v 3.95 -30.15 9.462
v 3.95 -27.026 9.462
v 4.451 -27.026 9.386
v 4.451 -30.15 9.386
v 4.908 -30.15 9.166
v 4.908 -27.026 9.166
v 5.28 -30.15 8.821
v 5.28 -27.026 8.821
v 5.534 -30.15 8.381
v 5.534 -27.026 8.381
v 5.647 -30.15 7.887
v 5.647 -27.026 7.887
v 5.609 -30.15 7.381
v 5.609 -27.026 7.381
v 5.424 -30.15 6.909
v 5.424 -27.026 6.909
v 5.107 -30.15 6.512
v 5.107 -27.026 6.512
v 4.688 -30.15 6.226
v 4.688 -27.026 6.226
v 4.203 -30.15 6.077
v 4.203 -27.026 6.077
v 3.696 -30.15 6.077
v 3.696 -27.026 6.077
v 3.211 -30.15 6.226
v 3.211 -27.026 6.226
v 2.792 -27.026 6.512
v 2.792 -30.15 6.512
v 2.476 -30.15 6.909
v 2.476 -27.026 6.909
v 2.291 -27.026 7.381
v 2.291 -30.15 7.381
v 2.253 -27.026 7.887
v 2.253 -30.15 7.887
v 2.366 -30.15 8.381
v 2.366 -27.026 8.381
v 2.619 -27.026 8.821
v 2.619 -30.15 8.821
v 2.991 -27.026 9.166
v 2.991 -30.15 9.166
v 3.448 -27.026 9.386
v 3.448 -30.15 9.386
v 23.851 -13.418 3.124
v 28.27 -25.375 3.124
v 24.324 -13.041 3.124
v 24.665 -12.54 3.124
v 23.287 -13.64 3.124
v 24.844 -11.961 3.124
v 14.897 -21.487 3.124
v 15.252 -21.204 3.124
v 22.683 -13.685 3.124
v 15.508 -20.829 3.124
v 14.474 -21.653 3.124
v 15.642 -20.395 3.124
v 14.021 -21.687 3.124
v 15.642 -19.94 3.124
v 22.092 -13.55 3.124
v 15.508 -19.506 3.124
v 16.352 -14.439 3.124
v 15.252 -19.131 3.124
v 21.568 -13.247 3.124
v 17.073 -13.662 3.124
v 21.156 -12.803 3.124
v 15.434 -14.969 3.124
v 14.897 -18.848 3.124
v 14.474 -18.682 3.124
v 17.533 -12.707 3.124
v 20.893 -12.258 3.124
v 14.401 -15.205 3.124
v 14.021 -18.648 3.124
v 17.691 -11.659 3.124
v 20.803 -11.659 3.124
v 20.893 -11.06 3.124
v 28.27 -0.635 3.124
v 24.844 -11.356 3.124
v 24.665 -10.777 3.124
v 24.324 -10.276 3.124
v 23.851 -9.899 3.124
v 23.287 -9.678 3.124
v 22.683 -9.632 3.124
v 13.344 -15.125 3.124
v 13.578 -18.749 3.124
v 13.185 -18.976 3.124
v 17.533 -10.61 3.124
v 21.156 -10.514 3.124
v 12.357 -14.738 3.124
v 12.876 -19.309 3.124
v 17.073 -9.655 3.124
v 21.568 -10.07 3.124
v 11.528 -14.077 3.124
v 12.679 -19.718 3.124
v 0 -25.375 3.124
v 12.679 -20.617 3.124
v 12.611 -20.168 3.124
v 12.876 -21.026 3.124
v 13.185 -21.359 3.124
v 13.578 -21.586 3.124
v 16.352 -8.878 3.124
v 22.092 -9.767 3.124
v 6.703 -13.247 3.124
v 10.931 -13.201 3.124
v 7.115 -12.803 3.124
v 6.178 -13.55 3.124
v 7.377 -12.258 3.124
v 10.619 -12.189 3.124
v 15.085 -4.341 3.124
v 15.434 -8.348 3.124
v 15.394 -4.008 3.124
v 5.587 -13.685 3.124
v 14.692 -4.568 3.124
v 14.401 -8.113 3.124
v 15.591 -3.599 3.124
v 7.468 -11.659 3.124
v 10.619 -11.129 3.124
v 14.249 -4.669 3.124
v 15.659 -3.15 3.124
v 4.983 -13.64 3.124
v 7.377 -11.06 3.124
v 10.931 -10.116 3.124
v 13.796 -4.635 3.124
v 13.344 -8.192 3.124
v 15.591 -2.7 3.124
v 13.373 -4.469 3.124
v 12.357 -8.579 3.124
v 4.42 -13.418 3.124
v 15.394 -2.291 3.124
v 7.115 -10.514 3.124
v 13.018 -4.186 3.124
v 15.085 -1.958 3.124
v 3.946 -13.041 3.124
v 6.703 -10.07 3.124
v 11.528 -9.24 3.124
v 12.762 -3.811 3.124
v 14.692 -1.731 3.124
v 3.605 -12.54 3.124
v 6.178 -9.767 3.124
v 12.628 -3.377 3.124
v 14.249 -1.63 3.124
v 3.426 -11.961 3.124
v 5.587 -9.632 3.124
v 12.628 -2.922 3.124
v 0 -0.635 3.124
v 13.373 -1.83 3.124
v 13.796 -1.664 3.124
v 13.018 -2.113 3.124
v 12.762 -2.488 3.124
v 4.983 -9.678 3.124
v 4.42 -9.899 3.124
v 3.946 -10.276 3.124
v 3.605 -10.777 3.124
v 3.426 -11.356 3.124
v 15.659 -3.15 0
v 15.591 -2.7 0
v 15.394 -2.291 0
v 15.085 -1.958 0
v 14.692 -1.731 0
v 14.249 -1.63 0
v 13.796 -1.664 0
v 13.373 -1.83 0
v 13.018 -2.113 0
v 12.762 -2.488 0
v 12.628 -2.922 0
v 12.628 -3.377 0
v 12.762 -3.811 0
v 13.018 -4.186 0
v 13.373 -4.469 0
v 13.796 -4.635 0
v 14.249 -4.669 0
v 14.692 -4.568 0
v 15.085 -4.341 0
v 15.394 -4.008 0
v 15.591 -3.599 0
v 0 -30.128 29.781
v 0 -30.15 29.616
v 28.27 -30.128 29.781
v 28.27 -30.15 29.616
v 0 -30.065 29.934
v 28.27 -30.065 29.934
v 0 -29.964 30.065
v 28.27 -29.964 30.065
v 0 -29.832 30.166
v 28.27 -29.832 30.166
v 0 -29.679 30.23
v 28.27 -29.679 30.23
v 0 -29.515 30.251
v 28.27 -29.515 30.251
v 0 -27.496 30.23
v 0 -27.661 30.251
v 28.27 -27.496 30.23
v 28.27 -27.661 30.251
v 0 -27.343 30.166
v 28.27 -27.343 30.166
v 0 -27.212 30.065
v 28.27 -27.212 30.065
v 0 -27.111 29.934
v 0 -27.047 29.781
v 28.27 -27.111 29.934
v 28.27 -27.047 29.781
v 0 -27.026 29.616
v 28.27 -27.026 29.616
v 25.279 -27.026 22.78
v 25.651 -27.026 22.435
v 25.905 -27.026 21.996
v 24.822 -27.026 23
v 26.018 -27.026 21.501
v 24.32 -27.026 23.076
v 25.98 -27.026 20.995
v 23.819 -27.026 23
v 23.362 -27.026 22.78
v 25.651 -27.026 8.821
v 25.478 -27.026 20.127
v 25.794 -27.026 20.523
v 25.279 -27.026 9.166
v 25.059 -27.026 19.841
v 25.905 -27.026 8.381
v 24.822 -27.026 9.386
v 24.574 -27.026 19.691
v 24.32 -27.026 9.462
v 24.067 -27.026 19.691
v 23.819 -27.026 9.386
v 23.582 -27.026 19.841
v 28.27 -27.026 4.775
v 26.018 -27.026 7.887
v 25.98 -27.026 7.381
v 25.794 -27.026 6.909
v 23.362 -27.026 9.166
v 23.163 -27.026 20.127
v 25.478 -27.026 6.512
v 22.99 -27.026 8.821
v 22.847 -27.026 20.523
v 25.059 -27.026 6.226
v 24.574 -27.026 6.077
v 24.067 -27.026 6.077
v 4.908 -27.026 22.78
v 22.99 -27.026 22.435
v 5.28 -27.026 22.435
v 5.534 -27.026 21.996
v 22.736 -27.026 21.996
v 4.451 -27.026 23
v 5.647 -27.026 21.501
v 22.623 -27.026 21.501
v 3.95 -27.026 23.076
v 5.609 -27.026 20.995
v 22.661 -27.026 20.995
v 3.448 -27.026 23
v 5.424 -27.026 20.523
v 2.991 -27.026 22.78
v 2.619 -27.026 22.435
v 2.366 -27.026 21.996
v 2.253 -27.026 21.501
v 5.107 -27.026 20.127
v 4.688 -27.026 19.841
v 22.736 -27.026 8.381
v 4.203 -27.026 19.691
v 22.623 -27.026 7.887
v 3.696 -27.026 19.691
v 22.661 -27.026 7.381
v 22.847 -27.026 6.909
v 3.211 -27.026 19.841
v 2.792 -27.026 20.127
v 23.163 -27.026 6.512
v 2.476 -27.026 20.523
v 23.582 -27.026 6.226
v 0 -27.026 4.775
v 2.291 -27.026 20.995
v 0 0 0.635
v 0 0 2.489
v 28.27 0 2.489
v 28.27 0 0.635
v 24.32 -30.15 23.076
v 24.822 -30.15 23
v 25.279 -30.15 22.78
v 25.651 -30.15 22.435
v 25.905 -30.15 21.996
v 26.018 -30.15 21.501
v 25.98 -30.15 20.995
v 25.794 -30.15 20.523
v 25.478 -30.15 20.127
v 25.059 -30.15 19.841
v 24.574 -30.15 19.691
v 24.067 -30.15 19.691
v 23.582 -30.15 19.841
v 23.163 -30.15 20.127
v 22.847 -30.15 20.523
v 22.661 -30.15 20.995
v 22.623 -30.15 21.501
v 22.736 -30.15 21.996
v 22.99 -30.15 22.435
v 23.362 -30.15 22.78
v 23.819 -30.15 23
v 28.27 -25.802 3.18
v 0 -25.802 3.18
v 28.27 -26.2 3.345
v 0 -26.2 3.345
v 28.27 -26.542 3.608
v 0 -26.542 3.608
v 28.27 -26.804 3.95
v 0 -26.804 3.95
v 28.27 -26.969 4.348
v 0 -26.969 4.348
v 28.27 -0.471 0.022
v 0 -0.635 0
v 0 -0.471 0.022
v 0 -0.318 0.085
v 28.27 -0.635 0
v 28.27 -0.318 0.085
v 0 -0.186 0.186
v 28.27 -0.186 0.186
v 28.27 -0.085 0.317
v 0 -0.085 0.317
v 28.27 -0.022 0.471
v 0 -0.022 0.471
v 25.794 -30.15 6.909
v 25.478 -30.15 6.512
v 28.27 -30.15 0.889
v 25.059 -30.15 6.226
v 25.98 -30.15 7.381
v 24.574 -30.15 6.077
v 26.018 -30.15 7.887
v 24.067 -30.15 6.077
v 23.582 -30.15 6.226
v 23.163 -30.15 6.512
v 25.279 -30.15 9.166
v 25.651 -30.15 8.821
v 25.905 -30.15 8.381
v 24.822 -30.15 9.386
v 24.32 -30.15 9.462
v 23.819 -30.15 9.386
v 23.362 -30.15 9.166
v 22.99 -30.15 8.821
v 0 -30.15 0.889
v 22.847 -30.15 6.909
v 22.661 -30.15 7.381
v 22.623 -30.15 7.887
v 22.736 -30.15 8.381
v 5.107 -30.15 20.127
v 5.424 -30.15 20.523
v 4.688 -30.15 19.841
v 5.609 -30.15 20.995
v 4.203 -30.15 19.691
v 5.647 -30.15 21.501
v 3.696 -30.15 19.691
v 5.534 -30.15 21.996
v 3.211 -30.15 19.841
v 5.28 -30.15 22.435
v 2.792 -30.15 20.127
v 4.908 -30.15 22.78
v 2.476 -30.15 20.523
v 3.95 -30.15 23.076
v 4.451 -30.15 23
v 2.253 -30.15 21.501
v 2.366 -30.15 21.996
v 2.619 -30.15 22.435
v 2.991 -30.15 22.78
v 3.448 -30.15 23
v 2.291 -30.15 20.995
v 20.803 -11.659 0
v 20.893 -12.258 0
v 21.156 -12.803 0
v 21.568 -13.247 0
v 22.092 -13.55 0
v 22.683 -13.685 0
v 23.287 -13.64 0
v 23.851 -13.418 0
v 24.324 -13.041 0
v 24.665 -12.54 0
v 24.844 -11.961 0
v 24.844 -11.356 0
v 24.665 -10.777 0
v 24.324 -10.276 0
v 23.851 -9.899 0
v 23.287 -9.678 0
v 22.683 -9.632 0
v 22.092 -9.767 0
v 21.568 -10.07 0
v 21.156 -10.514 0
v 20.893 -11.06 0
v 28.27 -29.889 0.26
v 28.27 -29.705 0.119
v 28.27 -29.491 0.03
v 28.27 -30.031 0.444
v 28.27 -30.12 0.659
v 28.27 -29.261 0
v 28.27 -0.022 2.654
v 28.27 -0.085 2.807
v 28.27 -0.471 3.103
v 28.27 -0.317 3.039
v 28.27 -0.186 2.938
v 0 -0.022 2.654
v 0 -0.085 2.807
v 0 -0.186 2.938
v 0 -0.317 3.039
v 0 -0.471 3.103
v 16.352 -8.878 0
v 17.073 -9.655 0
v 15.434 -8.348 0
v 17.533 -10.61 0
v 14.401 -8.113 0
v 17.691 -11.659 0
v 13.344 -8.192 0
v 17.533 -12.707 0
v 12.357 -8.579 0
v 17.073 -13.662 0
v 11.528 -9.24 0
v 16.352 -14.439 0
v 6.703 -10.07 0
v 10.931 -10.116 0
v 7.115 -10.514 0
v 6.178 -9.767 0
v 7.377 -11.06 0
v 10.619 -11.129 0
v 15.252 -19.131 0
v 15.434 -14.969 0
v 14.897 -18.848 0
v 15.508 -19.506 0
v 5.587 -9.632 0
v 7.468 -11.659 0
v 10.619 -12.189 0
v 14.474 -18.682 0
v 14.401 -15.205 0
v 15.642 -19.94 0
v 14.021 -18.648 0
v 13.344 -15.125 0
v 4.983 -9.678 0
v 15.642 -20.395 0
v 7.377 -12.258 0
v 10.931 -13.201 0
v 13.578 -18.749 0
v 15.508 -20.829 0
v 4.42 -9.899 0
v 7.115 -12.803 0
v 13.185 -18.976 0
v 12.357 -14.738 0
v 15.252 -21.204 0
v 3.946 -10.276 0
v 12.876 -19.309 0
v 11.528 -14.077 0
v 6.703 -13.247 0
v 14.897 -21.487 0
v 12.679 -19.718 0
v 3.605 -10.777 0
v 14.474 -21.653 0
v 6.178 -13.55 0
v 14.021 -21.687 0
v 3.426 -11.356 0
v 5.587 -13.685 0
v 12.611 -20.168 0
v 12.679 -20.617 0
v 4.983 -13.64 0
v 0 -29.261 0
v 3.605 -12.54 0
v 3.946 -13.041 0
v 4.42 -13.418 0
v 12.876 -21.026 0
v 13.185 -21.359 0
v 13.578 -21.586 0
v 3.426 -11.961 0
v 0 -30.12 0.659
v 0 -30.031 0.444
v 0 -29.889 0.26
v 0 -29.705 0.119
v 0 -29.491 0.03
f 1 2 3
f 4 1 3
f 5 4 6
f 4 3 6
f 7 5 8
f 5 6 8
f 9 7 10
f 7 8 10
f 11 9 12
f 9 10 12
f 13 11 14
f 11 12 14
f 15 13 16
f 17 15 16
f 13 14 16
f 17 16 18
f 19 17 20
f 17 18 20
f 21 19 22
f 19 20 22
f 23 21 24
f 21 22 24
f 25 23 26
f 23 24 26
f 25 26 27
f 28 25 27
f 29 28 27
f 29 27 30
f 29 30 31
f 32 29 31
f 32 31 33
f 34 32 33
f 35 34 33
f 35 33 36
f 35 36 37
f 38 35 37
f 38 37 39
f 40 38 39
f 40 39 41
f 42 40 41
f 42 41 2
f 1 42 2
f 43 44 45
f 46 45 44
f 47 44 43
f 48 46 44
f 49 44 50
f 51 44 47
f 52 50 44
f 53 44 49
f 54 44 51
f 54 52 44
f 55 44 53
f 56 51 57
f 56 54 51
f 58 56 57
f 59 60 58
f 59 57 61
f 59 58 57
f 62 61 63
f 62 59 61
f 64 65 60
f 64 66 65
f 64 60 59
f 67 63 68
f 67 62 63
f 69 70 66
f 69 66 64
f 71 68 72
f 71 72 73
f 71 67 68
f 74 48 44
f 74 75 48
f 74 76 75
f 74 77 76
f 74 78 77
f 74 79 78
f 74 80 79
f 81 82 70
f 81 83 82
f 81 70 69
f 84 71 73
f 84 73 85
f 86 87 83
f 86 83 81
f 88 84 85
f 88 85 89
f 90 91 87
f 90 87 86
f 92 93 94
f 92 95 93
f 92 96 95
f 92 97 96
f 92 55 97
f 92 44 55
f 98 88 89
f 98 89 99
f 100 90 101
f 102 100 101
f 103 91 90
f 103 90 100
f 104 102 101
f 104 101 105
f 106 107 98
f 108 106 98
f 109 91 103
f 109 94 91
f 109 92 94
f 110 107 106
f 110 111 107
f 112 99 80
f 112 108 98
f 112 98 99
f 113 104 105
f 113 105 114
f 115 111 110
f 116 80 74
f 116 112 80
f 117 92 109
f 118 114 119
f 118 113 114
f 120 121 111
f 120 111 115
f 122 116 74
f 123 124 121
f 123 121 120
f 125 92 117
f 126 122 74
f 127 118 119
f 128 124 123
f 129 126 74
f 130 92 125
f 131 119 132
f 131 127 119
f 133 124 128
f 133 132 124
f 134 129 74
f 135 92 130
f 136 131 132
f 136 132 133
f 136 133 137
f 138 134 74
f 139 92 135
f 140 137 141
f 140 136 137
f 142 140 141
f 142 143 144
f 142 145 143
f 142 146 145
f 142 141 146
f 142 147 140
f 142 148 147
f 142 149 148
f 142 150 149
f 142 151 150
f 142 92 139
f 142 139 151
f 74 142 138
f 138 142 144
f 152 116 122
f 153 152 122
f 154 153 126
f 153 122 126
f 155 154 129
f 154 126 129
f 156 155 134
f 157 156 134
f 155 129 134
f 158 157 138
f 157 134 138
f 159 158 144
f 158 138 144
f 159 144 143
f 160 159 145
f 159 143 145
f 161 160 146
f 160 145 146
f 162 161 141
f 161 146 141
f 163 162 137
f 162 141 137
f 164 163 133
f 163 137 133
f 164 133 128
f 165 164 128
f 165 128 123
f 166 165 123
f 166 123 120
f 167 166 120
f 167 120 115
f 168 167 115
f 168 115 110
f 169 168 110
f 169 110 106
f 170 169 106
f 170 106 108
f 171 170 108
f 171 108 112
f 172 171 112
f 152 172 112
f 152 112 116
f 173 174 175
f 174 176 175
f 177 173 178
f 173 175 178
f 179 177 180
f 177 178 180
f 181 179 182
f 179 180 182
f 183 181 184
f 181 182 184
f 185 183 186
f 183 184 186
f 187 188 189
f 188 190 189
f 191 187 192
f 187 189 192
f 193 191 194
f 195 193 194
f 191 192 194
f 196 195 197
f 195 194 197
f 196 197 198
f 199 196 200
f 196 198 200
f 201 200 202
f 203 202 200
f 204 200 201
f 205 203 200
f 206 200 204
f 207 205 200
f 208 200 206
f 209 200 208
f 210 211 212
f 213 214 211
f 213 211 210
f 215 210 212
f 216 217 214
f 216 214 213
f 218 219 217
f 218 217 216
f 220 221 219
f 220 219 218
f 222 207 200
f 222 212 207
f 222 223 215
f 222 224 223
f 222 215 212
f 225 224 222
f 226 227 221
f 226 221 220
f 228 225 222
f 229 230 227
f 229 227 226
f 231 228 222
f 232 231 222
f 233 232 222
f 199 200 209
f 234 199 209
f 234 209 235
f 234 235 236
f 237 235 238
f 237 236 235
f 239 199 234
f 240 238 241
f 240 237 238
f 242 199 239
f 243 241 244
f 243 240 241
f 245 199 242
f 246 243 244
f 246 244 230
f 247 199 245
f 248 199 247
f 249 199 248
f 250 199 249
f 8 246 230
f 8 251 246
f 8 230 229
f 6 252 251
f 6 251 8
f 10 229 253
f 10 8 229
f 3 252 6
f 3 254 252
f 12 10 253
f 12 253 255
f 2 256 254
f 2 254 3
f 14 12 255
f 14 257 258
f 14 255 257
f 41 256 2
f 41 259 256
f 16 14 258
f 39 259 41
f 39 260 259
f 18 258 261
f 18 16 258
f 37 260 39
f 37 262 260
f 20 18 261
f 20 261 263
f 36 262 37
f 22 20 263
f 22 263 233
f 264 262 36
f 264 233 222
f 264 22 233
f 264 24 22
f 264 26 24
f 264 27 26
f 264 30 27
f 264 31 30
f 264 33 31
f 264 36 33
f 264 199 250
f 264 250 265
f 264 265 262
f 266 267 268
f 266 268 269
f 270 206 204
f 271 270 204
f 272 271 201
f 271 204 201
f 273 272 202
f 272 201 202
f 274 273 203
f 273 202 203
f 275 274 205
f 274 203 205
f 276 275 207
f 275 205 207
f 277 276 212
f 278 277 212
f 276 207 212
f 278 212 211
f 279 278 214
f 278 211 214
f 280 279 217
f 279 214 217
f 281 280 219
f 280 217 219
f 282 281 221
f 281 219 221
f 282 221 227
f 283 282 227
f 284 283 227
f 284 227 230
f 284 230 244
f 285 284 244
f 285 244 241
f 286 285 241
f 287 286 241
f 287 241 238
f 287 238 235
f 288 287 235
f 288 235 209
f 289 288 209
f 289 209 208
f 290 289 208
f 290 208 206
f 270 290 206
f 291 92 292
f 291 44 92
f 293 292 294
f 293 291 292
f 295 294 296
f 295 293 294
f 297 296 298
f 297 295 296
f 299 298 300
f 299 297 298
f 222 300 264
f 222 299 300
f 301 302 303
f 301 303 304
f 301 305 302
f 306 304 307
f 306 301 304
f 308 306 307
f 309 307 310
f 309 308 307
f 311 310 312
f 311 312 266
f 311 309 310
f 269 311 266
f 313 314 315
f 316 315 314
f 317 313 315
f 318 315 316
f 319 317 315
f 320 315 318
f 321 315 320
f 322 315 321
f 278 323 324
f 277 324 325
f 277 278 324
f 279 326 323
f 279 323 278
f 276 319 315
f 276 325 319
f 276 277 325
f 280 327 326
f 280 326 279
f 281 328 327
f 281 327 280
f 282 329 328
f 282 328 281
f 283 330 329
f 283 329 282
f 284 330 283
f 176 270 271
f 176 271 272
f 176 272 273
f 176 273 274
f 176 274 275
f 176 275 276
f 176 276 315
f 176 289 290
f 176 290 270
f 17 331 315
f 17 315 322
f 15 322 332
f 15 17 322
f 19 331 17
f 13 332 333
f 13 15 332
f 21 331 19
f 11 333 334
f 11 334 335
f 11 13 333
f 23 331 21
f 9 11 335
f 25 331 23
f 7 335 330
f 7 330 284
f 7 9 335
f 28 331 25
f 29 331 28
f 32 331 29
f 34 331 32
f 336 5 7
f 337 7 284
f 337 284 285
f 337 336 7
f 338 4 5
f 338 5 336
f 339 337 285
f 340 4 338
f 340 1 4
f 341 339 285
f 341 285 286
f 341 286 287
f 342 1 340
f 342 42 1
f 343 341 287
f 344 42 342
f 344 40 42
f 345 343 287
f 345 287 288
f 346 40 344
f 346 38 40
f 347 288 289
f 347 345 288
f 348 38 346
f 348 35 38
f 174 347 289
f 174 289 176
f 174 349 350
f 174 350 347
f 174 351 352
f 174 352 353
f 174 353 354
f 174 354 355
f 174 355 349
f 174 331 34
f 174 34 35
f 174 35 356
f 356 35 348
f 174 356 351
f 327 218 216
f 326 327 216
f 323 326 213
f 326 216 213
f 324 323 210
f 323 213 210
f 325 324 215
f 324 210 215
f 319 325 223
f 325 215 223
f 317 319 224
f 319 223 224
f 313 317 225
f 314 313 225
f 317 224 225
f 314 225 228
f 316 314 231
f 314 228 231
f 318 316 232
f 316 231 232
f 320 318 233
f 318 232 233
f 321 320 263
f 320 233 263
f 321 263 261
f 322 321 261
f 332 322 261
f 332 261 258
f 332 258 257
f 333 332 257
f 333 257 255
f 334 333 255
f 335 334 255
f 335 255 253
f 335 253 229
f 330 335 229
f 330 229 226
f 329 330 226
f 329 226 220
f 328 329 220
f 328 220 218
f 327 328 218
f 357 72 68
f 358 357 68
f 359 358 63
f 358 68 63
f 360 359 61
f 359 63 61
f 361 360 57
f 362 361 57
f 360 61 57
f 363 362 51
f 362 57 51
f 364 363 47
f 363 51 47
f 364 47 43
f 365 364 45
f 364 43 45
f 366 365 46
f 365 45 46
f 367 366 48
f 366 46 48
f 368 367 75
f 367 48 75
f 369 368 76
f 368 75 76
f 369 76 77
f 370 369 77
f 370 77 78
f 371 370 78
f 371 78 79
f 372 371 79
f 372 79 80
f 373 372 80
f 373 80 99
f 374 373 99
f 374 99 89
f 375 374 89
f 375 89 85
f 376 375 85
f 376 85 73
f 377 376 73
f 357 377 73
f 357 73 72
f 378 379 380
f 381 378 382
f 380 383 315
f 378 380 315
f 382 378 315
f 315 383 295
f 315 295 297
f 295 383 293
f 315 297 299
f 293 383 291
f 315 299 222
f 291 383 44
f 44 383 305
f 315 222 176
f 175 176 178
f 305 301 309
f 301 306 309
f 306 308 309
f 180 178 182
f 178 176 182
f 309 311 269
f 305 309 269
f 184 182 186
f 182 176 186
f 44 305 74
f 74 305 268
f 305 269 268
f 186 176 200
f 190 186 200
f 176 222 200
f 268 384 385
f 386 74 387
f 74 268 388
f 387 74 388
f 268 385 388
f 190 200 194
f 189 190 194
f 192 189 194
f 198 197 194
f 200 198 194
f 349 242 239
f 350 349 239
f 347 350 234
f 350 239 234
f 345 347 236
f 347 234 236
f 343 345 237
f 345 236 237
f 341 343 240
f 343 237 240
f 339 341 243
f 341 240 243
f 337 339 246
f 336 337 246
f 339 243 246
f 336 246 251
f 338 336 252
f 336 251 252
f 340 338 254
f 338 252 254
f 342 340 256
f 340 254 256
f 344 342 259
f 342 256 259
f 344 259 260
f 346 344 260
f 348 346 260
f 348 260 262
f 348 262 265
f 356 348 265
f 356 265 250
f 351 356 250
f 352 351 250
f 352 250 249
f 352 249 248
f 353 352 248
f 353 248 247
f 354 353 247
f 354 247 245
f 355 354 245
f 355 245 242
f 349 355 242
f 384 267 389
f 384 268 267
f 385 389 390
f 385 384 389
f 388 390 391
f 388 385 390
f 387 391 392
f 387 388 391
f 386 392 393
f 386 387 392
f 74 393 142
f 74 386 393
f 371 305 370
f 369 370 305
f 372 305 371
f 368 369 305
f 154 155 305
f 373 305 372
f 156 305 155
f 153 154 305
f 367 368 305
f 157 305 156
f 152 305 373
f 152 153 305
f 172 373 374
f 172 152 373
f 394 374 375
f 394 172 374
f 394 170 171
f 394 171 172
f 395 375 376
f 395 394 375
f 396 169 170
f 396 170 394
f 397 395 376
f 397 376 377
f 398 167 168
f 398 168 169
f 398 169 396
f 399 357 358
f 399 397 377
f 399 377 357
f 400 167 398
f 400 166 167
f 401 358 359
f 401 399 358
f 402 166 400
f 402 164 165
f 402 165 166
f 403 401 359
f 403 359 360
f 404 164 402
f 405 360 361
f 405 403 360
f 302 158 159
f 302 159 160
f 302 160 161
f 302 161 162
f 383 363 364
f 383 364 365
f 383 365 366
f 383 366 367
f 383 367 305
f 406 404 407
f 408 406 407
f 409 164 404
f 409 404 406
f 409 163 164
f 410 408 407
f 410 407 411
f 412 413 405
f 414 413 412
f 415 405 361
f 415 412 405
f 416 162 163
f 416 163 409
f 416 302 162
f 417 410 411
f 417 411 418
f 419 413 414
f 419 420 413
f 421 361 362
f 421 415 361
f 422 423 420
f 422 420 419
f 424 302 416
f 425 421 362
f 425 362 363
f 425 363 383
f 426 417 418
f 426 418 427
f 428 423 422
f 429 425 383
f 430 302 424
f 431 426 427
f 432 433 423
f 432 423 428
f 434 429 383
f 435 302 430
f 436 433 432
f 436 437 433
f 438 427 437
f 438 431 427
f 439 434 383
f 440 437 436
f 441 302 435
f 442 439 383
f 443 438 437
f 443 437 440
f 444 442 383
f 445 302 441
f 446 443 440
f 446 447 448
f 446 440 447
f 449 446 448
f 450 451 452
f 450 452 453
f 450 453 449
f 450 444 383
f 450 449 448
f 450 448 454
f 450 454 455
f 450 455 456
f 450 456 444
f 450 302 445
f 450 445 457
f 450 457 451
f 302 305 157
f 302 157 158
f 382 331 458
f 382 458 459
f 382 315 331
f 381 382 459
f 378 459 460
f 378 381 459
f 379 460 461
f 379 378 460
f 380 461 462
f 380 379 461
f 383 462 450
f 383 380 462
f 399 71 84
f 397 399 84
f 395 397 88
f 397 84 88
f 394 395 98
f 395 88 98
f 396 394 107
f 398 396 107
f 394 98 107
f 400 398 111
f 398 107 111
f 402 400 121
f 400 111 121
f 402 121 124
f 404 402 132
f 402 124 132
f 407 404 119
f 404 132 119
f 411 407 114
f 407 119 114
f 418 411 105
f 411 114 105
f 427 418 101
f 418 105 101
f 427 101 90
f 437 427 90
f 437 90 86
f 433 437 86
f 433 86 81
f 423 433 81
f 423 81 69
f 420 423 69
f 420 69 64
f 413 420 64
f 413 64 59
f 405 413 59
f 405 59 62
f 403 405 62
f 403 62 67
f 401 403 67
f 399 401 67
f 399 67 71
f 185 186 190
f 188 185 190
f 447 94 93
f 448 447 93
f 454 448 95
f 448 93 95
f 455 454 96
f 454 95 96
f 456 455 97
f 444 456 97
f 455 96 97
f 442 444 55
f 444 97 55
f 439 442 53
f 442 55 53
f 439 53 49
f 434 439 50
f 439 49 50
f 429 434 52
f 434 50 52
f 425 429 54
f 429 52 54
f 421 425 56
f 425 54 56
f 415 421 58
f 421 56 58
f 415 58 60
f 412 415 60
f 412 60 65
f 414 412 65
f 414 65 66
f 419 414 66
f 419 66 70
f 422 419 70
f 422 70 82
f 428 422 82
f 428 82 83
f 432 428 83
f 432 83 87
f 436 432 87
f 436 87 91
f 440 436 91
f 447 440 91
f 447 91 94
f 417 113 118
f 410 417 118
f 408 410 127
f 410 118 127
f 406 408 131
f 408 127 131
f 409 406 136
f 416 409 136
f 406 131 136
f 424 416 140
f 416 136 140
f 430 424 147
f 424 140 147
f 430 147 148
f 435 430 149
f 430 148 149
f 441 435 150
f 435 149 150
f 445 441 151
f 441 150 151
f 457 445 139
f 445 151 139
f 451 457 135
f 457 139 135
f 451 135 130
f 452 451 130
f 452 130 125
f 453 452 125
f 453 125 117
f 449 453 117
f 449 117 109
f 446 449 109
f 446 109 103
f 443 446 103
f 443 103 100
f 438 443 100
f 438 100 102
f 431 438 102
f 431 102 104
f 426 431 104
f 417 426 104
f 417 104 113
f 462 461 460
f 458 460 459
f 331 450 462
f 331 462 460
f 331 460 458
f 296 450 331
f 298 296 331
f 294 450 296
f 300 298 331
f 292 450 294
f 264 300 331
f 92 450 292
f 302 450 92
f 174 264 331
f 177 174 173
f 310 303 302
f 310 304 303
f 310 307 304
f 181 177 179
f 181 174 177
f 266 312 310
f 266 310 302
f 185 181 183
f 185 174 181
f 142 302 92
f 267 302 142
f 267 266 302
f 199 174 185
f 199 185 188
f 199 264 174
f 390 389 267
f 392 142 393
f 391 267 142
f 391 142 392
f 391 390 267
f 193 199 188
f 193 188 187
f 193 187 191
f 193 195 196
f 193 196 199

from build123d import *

# Parameters (mm, degrees)
BOSS_EXTRUDE1_DEPTH     = 28.2702
SKETCH2_R               = 3.556
SKETCH2_R_2             = 1.524
SKETCH2_R_3             = 2.032
MOTOR_MOUNT_HOLES_DEPTH = 50.437835996
SKETCH3_R               = 1.7018
PLATE_MOUNT_HOLES_DEPTH = 50.444256141
FILLET1_R               = 1.651
FILLET2_R               = 0.889
FILLET3_R               = 0.635


with BuildPart() as part:
    # Sketch1 → Boss-Extrude1 (new body)
    with BuildSketch(Plane(origin=(0, 0, 0), x_dir=(0, 0, -1), z_dir=(1, 0, 0))):
        Polygon((0, 0), (0, -30.1498), (-30.2514, -30.1498), (-30.2514, -27.0256), (-3.1242, -27.0256), (-3.1242, 0), align=None)
    extrude(amount=BOSS_EXTRUDE1_DEPTH)

    # Sketch2 → Motor_Mount_holes (cut, through all)
    with BuildSketch(Plane.XY.offset(3.1242)):
        with Locations((14.1351, -11.6586)):
            Circle(SKETCH2_R)
        with Locations((14.1351, -3.1496)):
            Circle(SKETCH2_R_2)
        with Locations((5.4356, -11.6586)):
            Circle(SKETCH2_R_3)
        with Locations(Location((22.8346, -11.6586, 0), (0, 0, 180))):
            Circle(SKETCH2_R_3)
        with Locations(Location((14.1351, -20.1676, 0), (0, 0, 180))):
            Circle(SKETCH2_R_2)
    extrude(amount=-MOTOR_MOUNT_HOLES_DEPTH, mode=Mode.SUBTRACT)

    # Sketch3 → Plate_Mount_Holes (cut, through all)
    with BuildSketch(Plane(origin=(0, -27.0256, 0), x_dir=(1, 0, 0), z_dir=(0, 1, 0))):
        with Locations(Location((24.3205, -7.7597, 0), (0, 0, 270))):
            Circle(SKETCH3_R)
        with Locations(Location((3.9497, -7.7597, 0), (0, 0, 270))):
            Circle(SKETCH3_R)
        with Locations(Location((3.9497, -21.3741, 0), (0, 0, 270))):
            Circle(SKETCH3_R)
        with Locations(Location((24.3205, -21.3741, 0), (0, 0, 270))):
            Circle(SKETCH3_R)
    extrude(amount=-PLATE_MOUNT_HOLES_DEPTH, mode=Mode.SUBTRACT)

    # Fillet1
    fillet1_edges = [part.edges().sort_by_distance(p)[0] for p in [
        (14.1351, -27.0256, 3.1242),
    ]]
    fillet(fillet1_edges, radius=FILLET1_R)

    # Fillet2
    fillet2_edges = [part.edges().sort_by_distance(p)[0] for p in [
        (14.1351, -30.1498, 0),
    ]]
    fillet(fillet2_edges, radius=FILLET2_R)

    # Fillet3
    fillet3_edges = [part.edges().sort_by_distance(p)[0] for p in [
        (14.1351, 0, 0),
        (14.1351, -30.1498, 30.2514),
        (14.1351, -27.0256, 30.2514),
        (14.1351, 0, 3.1242),
    ]]
    fillet(fillet3_edges, radius=FILLET3_R)


solid = part.part
